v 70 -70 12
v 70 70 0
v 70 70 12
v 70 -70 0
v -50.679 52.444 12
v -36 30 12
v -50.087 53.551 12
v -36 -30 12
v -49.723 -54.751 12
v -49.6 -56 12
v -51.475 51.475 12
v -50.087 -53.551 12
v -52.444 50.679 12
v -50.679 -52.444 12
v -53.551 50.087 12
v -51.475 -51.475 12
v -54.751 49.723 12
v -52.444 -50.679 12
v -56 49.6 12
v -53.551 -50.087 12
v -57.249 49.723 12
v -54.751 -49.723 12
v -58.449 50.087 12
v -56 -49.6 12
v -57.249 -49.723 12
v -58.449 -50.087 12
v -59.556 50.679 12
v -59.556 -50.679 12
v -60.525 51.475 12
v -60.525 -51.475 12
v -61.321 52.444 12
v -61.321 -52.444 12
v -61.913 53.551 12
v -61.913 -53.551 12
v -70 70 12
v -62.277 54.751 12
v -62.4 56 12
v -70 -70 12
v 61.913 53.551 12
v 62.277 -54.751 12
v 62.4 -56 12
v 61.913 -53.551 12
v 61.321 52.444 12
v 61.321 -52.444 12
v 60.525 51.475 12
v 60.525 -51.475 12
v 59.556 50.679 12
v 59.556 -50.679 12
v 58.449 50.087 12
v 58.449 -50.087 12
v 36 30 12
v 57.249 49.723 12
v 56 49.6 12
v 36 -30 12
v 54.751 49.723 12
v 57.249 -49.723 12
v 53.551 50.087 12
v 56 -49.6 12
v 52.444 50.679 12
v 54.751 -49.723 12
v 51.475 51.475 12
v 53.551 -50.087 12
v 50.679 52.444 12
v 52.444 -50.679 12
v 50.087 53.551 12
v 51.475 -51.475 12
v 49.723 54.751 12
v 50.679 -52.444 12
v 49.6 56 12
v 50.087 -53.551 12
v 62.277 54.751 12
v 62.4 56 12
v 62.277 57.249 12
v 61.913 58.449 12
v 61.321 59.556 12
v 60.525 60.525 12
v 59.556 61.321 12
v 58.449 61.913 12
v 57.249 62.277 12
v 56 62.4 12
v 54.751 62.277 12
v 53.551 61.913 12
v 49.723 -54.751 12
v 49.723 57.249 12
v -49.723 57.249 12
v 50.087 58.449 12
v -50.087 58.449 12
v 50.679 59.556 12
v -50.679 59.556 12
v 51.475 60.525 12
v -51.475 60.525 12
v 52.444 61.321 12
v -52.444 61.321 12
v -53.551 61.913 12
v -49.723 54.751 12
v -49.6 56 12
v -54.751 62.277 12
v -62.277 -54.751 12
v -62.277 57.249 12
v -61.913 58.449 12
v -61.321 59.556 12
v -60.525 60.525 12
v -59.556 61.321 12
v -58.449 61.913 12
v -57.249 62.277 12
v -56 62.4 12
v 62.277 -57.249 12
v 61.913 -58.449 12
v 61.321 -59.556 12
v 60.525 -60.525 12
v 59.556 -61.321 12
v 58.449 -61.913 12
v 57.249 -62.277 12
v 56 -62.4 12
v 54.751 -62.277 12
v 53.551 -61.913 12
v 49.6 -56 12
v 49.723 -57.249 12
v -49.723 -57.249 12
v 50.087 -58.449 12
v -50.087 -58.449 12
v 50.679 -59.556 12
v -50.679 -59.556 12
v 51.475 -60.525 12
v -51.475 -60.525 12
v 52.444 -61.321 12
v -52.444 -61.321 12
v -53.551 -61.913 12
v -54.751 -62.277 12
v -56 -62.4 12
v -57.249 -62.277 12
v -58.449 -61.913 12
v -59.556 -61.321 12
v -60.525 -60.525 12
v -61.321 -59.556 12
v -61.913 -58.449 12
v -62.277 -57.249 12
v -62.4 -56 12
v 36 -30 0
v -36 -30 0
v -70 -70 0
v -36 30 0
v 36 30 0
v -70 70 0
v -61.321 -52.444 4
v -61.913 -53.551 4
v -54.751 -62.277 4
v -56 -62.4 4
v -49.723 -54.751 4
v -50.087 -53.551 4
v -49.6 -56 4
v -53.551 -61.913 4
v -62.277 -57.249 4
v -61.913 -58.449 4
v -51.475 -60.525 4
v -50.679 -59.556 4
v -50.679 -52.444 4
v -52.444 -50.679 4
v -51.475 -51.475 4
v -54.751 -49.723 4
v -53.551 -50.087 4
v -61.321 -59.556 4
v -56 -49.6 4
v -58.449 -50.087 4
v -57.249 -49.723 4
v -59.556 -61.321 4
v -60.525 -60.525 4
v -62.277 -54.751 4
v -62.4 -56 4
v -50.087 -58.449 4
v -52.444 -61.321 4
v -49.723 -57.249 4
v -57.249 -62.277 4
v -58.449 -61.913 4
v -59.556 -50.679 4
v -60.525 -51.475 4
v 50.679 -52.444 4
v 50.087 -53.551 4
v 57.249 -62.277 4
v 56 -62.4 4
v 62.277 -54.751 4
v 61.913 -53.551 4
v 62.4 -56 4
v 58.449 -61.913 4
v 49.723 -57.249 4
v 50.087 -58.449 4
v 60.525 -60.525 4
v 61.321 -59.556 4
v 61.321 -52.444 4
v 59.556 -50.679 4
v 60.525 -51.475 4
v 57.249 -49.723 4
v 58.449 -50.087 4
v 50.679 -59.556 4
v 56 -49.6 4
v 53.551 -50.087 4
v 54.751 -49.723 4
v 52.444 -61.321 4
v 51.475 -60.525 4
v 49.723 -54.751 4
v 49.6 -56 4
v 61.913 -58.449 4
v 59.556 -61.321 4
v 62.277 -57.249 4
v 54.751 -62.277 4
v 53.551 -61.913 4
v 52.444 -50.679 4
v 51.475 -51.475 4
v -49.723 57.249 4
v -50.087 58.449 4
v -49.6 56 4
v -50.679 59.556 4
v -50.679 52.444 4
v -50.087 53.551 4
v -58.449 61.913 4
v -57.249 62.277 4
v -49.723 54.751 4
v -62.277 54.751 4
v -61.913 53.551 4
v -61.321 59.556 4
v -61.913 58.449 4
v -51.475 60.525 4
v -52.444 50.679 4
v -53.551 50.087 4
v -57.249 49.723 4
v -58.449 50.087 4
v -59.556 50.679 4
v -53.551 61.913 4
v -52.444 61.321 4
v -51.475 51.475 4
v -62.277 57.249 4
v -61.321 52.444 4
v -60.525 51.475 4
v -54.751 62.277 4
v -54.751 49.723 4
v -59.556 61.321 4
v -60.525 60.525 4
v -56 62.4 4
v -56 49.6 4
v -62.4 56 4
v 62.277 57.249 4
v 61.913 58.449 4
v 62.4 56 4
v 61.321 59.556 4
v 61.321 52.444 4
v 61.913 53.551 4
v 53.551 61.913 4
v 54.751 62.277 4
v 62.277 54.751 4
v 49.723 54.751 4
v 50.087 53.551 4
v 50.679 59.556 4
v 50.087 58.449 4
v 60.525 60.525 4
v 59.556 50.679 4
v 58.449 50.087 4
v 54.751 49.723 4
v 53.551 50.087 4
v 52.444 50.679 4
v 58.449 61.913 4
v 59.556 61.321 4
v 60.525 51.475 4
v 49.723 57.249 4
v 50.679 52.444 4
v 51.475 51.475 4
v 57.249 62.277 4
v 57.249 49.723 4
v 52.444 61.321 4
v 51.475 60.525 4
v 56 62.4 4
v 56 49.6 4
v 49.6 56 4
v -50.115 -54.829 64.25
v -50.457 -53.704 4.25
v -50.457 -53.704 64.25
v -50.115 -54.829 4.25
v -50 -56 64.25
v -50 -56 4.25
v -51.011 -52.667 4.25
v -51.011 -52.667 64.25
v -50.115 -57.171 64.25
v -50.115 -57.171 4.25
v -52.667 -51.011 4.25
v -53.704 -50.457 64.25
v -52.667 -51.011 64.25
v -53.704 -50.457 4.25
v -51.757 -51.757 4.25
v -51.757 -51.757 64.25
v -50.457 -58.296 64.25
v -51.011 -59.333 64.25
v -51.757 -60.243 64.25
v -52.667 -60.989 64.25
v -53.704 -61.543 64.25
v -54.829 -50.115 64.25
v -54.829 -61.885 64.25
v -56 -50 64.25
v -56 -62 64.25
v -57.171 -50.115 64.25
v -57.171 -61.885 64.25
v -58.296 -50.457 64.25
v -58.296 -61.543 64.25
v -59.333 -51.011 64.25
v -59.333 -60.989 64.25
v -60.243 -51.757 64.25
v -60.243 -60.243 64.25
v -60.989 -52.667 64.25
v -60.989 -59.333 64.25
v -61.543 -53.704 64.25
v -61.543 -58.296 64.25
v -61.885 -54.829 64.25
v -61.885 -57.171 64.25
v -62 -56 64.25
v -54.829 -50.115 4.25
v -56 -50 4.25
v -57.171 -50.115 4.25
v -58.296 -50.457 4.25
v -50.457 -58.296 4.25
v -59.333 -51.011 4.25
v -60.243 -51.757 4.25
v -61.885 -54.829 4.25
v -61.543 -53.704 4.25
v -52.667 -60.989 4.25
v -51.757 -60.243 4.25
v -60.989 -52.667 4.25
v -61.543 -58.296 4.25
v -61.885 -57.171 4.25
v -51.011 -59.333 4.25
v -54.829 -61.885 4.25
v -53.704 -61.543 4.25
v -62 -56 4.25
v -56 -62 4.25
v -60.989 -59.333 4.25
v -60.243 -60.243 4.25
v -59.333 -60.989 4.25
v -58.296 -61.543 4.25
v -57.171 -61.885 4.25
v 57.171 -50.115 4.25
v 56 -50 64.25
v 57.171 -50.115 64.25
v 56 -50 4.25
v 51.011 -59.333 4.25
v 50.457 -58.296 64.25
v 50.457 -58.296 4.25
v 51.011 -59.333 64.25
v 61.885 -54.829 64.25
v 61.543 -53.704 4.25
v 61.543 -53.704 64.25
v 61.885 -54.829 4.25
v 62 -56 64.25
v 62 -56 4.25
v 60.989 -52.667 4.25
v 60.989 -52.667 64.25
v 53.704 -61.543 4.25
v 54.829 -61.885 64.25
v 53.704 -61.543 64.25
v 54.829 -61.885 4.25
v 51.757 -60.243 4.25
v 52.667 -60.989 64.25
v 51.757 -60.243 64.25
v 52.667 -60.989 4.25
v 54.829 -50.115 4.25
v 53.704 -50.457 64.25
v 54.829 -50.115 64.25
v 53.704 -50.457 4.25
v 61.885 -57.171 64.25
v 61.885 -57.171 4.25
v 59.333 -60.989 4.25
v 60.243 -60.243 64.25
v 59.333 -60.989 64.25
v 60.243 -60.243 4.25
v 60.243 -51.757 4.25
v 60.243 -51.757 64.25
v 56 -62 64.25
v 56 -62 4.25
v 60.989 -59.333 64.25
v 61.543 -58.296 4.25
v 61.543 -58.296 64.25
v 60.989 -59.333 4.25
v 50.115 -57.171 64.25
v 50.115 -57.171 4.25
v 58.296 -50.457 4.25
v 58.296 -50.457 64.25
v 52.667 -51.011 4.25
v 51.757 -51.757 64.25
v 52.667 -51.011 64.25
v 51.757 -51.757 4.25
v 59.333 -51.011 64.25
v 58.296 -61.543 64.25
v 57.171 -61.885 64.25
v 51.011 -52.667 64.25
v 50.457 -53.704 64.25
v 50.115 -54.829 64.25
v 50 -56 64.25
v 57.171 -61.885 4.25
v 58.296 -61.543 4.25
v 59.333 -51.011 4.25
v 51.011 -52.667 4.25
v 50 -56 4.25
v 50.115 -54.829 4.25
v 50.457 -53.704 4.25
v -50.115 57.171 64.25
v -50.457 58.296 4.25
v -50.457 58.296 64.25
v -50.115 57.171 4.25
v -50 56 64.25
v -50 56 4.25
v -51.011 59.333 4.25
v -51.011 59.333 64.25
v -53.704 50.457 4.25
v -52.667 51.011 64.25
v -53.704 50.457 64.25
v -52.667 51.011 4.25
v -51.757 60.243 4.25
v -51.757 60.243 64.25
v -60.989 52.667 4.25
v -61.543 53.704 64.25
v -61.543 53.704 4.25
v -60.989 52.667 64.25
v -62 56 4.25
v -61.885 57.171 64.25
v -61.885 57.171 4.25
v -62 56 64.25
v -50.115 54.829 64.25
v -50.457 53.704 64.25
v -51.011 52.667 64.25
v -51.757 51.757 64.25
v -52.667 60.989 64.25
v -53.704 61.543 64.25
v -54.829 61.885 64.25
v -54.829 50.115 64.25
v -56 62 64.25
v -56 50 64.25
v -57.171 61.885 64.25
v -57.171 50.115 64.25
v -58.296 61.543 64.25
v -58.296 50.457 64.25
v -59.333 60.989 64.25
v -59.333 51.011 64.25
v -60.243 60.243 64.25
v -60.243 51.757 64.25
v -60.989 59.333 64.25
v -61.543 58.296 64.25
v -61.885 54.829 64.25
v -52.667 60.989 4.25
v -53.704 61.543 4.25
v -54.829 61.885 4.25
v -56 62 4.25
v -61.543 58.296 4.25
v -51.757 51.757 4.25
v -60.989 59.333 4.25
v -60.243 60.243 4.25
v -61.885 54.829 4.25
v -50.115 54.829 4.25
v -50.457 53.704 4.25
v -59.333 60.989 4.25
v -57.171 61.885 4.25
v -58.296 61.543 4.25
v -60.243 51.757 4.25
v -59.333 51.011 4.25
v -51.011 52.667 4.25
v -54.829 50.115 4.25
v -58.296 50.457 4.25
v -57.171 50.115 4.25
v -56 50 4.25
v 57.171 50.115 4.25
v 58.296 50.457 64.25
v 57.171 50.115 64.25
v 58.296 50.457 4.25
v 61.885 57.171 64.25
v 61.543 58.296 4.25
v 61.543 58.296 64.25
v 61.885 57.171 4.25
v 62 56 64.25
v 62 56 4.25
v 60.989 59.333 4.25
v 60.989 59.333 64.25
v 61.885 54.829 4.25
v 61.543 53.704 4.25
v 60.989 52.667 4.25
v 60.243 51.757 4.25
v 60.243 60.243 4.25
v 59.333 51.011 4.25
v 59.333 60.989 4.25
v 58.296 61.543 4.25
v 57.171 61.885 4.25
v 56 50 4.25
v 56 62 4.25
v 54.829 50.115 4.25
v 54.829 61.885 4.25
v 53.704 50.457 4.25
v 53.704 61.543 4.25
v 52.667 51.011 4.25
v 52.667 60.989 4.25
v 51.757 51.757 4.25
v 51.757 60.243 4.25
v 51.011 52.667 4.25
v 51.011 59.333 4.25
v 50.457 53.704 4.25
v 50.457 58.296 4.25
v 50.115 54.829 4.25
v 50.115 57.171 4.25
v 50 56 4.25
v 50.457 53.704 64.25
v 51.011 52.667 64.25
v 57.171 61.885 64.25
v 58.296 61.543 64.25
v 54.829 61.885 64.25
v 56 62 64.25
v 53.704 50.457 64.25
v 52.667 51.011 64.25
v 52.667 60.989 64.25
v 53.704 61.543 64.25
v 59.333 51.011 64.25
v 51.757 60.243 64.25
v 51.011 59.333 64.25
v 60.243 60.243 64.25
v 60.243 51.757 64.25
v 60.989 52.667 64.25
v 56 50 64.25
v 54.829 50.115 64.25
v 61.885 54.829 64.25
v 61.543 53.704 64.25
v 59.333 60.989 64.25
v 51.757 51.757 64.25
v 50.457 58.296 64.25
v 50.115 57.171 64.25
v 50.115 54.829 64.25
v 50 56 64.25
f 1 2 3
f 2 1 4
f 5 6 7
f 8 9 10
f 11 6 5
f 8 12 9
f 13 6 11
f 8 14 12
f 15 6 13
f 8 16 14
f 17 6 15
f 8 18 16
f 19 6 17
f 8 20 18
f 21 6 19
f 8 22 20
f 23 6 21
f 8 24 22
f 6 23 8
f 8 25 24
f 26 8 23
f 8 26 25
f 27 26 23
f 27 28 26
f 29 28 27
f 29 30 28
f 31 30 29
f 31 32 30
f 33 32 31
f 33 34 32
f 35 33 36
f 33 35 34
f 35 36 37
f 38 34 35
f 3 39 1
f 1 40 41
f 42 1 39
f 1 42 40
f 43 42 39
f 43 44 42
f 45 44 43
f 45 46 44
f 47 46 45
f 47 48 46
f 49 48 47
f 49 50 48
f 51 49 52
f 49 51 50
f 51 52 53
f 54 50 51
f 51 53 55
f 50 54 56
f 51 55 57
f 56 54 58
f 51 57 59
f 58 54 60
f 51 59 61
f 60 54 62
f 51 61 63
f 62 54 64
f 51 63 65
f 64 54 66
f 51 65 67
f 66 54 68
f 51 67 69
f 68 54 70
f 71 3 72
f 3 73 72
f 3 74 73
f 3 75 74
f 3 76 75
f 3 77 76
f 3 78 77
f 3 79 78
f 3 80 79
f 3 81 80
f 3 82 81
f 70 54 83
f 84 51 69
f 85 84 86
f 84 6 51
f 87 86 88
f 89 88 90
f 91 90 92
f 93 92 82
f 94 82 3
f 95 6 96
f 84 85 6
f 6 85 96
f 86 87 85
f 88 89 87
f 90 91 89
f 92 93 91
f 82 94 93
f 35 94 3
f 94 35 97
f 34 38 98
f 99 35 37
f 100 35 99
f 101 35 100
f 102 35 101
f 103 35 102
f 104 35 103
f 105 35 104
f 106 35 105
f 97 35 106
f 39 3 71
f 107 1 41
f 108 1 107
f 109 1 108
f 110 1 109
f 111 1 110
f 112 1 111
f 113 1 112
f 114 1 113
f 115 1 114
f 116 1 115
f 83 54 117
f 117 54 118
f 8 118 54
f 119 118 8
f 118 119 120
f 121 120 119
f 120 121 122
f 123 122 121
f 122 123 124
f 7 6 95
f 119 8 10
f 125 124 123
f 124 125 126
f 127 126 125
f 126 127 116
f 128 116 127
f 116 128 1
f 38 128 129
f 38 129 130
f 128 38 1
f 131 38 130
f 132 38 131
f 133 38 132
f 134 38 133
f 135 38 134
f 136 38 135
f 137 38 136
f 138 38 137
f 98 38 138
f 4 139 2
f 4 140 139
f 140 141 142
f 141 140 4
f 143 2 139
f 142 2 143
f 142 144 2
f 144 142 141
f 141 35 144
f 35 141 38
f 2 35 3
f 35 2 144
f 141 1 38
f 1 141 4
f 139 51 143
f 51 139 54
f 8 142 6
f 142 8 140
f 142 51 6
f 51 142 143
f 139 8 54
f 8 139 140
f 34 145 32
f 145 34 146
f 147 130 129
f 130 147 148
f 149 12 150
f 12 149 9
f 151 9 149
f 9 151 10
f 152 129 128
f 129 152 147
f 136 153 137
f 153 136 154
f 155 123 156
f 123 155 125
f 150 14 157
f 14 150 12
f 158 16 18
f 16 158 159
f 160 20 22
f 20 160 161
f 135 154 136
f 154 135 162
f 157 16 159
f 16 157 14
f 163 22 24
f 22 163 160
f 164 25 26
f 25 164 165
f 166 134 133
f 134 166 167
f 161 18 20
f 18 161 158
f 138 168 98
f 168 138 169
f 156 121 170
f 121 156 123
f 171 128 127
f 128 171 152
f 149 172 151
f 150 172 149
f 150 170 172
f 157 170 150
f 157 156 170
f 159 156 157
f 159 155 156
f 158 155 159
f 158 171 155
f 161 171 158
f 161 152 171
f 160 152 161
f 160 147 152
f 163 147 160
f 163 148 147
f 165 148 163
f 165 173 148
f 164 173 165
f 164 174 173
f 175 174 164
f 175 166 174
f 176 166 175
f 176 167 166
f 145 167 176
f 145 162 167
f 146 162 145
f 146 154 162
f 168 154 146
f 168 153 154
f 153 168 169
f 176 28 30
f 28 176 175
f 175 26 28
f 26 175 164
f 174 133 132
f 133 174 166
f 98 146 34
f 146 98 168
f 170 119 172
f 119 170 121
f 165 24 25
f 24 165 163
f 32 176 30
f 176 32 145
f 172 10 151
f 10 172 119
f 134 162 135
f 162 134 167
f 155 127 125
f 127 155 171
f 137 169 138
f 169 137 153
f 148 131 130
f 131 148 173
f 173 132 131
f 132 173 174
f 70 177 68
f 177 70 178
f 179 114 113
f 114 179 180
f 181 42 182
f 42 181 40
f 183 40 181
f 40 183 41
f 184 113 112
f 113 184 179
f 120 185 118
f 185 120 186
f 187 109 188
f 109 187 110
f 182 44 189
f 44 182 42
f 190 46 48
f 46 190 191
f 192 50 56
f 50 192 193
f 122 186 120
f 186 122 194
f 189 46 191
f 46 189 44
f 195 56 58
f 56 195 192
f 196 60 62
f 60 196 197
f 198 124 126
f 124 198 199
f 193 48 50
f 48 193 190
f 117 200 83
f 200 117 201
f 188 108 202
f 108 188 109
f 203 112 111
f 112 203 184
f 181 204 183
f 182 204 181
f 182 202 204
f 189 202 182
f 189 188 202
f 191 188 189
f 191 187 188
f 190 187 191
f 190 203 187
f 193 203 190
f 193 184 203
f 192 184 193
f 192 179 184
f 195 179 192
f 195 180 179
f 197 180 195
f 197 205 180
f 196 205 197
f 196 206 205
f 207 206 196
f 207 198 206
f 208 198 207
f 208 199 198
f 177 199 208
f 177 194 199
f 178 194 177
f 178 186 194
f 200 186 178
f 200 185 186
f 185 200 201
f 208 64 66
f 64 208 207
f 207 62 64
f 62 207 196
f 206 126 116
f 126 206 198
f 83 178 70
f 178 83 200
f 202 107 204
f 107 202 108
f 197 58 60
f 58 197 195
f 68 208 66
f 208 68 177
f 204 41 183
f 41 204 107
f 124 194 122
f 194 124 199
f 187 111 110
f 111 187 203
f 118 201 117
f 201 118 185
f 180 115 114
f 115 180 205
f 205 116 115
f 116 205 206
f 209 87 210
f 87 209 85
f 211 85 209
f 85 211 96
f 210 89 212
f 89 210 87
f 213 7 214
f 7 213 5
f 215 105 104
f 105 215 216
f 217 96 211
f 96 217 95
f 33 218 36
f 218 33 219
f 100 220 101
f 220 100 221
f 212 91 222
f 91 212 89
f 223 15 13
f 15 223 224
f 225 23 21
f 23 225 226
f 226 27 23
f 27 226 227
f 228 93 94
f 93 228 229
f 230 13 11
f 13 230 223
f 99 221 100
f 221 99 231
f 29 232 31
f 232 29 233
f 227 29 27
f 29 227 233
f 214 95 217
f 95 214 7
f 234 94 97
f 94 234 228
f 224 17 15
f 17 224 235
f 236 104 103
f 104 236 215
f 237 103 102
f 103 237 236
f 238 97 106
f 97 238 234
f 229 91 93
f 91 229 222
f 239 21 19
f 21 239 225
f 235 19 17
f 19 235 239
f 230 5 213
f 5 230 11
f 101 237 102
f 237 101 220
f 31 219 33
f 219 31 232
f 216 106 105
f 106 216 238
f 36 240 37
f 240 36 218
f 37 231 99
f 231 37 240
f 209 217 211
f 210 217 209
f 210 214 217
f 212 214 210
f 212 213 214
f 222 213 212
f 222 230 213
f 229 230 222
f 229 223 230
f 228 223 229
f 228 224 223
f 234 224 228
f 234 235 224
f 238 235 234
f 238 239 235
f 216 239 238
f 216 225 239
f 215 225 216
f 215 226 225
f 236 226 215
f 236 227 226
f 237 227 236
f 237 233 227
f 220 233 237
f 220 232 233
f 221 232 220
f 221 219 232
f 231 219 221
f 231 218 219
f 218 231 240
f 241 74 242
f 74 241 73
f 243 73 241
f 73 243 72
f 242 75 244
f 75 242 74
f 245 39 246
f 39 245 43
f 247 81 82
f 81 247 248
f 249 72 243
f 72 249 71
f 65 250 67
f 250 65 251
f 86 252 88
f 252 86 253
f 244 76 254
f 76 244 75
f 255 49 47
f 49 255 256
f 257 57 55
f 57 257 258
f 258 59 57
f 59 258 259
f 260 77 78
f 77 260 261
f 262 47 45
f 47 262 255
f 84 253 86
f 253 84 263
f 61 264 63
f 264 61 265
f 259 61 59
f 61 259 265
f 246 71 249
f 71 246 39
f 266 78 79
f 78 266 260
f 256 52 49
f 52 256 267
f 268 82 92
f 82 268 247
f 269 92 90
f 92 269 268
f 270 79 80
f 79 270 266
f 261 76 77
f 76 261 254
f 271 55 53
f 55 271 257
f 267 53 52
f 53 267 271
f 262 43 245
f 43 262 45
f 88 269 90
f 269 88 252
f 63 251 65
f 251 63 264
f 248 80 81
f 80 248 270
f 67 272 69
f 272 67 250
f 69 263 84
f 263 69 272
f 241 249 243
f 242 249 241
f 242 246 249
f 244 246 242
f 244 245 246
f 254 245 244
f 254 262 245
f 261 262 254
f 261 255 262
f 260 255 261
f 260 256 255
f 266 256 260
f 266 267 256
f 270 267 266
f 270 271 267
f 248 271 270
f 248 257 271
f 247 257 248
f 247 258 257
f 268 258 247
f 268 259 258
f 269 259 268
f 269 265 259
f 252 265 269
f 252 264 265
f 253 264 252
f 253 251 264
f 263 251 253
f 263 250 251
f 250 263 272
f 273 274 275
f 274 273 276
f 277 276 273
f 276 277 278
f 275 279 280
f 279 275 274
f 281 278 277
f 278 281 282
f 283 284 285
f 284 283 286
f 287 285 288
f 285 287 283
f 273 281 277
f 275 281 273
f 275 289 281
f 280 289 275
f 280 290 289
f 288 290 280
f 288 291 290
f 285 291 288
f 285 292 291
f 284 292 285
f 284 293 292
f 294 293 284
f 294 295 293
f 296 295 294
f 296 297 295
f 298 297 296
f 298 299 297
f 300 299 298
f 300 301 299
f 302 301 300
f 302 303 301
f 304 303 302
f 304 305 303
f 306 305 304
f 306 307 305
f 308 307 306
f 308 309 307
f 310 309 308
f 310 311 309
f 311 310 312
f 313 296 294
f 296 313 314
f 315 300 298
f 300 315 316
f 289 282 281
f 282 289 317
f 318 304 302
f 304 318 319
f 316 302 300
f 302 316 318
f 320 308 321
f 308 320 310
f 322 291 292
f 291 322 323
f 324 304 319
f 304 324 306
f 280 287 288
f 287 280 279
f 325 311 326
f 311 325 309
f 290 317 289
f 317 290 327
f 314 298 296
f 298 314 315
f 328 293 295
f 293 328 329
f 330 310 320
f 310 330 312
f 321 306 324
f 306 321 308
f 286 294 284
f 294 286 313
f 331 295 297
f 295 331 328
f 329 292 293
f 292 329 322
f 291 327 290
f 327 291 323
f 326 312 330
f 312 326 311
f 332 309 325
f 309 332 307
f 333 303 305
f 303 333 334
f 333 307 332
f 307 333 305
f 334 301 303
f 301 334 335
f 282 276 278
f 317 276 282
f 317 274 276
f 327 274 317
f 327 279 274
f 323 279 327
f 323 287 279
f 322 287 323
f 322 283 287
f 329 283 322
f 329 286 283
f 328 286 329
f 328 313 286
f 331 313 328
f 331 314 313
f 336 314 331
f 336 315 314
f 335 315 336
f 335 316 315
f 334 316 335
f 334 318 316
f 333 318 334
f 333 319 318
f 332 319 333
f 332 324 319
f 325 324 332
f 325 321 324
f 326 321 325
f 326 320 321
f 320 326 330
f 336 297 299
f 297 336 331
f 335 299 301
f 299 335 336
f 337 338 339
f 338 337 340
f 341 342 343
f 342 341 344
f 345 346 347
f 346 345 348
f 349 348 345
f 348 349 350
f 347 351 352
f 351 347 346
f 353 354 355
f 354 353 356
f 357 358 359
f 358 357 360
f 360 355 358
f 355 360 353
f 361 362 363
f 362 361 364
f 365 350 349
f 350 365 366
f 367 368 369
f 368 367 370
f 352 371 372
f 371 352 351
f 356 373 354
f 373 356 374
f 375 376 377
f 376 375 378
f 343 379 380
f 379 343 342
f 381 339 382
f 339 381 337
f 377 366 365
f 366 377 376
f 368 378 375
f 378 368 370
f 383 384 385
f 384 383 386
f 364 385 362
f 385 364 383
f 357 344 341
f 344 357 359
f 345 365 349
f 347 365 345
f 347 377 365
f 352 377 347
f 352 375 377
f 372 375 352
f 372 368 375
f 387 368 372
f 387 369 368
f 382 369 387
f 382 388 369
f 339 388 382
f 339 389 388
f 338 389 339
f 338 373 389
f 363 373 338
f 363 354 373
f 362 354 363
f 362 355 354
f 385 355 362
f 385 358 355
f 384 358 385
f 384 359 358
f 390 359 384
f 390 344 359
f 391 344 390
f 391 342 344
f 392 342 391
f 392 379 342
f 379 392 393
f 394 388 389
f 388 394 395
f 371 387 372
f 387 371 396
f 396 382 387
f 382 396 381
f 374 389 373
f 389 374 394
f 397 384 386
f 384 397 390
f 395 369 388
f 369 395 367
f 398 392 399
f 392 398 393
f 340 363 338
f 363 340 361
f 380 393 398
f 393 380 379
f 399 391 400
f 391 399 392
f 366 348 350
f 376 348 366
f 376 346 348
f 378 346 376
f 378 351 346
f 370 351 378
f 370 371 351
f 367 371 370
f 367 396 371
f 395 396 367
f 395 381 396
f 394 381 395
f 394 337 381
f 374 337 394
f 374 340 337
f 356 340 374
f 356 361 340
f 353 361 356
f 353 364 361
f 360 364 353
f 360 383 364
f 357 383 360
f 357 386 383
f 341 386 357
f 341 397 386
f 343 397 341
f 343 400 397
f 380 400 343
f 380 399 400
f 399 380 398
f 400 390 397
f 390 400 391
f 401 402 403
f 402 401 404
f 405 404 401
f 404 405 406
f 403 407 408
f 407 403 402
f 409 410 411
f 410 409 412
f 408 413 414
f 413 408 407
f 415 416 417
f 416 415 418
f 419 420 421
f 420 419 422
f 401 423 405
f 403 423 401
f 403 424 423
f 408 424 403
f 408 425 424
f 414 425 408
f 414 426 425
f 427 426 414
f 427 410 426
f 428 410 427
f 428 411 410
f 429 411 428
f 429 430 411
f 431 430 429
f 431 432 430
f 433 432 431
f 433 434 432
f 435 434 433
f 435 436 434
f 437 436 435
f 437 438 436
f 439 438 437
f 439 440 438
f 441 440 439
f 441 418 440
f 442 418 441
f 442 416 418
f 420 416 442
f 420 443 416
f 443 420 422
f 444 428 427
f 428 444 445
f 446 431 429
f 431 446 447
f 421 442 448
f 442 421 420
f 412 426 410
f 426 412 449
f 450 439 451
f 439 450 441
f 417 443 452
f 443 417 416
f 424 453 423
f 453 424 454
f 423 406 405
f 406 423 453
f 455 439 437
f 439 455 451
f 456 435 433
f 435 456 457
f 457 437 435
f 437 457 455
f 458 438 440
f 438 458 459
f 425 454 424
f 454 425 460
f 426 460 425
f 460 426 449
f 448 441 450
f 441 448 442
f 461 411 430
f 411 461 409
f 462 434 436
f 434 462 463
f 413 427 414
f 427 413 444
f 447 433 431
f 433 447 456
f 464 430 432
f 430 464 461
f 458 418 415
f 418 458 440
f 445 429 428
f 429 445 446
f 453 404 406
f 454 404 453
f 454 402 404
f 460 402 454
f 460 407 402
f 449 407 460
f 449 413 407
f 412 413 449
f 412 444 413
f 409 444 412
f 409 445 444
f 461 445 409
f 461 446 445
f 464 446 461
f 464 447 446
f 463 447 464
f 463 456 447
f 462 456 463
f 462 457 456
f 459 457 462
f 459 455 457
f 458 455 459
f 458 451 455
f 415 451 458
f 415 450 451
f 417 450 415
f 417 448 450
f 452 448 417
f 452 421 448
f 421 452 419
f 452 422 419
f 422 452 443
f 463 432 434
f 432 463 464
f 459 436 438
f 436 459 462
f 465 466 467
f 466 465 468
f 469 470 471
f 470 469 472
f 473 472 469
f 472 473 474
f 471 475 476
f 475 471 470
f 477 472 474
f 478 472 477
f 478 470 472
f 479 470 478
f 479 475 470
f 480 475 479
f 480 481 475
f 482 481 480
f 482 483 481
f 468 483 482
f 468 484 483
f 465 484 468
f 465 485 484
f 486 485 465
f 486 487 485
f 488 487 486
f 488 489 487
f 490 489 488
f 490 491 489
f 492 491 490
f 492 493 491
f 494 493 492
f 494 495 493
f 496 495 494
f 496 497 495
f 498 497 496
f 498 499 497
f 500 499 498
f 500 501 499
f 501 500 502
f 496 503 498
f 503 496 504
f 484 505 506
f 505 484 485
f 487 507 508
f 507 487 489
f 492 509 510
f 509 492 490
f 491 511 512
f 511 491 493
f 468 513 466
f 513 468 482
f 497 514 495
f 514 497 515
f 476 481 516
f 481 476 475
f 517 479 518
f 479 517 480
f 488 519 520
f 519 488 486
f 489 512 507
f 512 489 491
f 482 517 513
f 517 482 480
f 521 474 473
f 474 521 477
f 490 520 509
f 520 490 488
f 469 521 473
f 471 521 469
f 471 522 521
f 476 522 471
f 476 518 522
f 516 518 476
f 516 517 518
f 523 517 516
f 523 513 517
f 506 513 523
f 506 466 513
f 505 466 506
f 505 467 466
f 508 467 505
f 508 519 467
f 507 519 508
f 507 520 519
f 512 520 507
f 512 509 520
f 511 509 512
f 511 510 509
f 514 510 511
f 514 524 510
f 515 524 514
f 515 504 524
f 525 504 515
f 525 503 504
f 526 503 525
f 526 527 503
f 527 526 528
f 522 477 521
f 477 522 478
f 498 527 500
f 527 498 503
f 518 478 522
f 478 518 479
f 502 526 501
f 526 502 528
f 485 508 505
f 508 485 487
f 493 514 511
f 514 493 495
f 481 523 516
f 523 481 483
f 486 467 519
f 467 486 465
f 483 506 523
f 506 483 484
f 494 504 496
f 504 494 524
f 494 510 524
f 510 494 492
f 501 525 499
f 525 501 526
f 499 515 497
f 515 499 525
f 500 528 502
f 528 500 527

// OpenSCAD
$fn = 32;

// ------------------------------------------------------------------------
// Frame with four posts: 140 x 140 mm frame, four d12 posts
// Every part is its own module, assembly() places them once.
// ------------------------------------------------------------------------

// --- part 1 ---
module base_frame() {
  difference() {
    translate([-70, -70, 0]) cube([140, 140, 12]);
    translate([-36, -30, -1]) cube([72, 60, 14]);
    translate([-56, -56, 4]) cylinder(h = 9, d = 12.8);
    translate([56, -56, 4]) cylinder(h = 9, d = 12.8);
    translate([-56, 56, 4]) cylinder(h = 9, d = 12.8);
    translate([56, 56, 4]) cylinder(h = 9, d = 12.8);
  }
}

// --- part 2 ---
module post1() {
  cylinder(h = 60, d = 12);
}

// --- part 3 ---
module post2() {
  cylinder(h = 60, d = 12);
}

// --- part 4 ---
module post3() {
  cylinder(h = 60, d = 12);
}

// --- part 5 ---
module post4() {
  cylinder(h = 60, d = 12);
}

// --- assembly ---
module assembly() {
  translate([0, 0, 0]) rotate([0, 0, 0]) base_frame();
  translate([-56, -56, 4.25]) rotate([0, 0, 0]) post1();
  translate([56, -56, 4.25]) rotate([0, 0, 0]) post2();
  translate([-56, 56, 4.25]) rotate([0, 0, 0]) post3();
  translate([56, 56, 4.25]) rotate([0, 0, 0]) post4();
}

assembly();
